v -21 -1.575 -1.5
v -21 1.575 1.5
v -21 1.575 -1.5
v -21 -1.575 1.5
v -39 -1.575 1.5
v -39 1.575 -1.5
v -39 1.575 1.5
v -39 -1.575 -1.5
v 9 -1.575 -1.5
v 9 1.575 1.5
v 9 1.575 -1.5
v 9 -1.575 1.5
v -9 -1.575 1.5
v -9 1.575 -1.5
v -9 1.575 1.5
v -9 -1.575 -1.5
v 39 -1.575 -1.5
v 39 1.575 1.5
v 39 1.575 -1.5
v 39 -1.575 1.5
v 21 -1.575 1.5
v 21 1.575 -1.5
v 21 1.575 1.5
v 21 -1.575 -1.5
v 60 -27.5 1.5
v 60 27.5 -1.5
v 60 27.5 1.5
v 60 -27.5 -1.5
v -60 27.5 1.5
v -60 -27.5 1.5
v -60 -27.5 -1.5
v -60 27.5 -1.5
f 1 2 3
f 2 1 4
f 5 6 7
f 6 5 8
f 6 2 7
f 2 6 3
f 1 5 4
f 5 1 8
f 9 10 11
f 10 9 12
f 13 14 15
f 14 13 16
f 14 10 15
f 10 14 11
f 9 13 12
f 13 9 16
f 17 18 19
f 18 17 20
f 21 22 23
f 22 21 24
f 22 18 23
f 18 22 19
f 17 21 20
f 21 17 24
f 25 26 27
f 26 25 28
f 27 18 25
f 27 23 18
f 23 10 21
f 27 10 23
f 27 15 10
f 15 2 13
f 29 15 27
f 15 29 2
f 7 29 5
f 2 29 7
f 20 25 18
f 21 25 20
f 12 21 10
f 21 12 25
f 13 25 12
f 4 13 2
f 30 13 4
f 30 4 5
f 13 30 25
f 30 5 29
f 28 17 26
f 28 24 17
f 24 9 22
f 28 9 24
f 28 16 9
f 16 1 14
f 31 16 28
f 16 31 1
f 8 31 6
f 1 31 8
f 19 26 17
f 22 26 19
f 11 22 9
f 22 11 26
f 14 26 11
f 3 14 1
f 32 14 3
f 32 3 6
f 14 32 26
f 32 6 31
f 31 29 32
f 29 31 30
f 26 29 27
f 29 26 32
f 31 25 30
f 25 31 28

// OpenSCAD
// Units: mm
material_thickness_mm = 3.0;
kerf_mm = 0.2;

panel_length_mm = 120.0;
panel_width_mm = 55.0;

slot_count = 3;
slot_length_mm = 18.0;
slot_width_mm = 3.15;
slot_gap_mm = 12.0;

slot_pitch_mm = slot_length_mm + slot_gap_mm;
min_web_mm = min(
    (panel_length_mm - (slot_count * slot_length_mm + (slot_count - 1) * slot_gap_mm)) / 2,
    slot_gap_mm,
    (panel_width_mm - slot_width_mm) / 2
);

echo(str(
    "MAKERBENCH-LASER2D: {",
    "\"material_thickness_mm\": ", material_thickness_mm, ", ",
    "\"kerf_mm\": ", kerf_mm, ", ",
    "\"slot_count\": ", slot_count, ", ",
    "\"slot_length_mm\": ", slot_length_mm, ", ",
    "\"slot_width_mm\": ", slot_width_mm, ", ",
    "\"min_web_mm\": ", min_web_mm,
    "}"
));

module slot_cut(xpos) {
    translate([xpos, 0, 0])
        cube([slot_length_mm, slot_width_mm, material_thickness_mm + 0.2], center = true);
}

difference() {
    cube([panel_length_mm, panel_width_mm, material_thickness_mm], center = true);

    for (i = [0 : slot_count - 1]) {
        slot_cut((i - (slot_count - 1) / 2) * slot_pitch_mm);
    }
}
